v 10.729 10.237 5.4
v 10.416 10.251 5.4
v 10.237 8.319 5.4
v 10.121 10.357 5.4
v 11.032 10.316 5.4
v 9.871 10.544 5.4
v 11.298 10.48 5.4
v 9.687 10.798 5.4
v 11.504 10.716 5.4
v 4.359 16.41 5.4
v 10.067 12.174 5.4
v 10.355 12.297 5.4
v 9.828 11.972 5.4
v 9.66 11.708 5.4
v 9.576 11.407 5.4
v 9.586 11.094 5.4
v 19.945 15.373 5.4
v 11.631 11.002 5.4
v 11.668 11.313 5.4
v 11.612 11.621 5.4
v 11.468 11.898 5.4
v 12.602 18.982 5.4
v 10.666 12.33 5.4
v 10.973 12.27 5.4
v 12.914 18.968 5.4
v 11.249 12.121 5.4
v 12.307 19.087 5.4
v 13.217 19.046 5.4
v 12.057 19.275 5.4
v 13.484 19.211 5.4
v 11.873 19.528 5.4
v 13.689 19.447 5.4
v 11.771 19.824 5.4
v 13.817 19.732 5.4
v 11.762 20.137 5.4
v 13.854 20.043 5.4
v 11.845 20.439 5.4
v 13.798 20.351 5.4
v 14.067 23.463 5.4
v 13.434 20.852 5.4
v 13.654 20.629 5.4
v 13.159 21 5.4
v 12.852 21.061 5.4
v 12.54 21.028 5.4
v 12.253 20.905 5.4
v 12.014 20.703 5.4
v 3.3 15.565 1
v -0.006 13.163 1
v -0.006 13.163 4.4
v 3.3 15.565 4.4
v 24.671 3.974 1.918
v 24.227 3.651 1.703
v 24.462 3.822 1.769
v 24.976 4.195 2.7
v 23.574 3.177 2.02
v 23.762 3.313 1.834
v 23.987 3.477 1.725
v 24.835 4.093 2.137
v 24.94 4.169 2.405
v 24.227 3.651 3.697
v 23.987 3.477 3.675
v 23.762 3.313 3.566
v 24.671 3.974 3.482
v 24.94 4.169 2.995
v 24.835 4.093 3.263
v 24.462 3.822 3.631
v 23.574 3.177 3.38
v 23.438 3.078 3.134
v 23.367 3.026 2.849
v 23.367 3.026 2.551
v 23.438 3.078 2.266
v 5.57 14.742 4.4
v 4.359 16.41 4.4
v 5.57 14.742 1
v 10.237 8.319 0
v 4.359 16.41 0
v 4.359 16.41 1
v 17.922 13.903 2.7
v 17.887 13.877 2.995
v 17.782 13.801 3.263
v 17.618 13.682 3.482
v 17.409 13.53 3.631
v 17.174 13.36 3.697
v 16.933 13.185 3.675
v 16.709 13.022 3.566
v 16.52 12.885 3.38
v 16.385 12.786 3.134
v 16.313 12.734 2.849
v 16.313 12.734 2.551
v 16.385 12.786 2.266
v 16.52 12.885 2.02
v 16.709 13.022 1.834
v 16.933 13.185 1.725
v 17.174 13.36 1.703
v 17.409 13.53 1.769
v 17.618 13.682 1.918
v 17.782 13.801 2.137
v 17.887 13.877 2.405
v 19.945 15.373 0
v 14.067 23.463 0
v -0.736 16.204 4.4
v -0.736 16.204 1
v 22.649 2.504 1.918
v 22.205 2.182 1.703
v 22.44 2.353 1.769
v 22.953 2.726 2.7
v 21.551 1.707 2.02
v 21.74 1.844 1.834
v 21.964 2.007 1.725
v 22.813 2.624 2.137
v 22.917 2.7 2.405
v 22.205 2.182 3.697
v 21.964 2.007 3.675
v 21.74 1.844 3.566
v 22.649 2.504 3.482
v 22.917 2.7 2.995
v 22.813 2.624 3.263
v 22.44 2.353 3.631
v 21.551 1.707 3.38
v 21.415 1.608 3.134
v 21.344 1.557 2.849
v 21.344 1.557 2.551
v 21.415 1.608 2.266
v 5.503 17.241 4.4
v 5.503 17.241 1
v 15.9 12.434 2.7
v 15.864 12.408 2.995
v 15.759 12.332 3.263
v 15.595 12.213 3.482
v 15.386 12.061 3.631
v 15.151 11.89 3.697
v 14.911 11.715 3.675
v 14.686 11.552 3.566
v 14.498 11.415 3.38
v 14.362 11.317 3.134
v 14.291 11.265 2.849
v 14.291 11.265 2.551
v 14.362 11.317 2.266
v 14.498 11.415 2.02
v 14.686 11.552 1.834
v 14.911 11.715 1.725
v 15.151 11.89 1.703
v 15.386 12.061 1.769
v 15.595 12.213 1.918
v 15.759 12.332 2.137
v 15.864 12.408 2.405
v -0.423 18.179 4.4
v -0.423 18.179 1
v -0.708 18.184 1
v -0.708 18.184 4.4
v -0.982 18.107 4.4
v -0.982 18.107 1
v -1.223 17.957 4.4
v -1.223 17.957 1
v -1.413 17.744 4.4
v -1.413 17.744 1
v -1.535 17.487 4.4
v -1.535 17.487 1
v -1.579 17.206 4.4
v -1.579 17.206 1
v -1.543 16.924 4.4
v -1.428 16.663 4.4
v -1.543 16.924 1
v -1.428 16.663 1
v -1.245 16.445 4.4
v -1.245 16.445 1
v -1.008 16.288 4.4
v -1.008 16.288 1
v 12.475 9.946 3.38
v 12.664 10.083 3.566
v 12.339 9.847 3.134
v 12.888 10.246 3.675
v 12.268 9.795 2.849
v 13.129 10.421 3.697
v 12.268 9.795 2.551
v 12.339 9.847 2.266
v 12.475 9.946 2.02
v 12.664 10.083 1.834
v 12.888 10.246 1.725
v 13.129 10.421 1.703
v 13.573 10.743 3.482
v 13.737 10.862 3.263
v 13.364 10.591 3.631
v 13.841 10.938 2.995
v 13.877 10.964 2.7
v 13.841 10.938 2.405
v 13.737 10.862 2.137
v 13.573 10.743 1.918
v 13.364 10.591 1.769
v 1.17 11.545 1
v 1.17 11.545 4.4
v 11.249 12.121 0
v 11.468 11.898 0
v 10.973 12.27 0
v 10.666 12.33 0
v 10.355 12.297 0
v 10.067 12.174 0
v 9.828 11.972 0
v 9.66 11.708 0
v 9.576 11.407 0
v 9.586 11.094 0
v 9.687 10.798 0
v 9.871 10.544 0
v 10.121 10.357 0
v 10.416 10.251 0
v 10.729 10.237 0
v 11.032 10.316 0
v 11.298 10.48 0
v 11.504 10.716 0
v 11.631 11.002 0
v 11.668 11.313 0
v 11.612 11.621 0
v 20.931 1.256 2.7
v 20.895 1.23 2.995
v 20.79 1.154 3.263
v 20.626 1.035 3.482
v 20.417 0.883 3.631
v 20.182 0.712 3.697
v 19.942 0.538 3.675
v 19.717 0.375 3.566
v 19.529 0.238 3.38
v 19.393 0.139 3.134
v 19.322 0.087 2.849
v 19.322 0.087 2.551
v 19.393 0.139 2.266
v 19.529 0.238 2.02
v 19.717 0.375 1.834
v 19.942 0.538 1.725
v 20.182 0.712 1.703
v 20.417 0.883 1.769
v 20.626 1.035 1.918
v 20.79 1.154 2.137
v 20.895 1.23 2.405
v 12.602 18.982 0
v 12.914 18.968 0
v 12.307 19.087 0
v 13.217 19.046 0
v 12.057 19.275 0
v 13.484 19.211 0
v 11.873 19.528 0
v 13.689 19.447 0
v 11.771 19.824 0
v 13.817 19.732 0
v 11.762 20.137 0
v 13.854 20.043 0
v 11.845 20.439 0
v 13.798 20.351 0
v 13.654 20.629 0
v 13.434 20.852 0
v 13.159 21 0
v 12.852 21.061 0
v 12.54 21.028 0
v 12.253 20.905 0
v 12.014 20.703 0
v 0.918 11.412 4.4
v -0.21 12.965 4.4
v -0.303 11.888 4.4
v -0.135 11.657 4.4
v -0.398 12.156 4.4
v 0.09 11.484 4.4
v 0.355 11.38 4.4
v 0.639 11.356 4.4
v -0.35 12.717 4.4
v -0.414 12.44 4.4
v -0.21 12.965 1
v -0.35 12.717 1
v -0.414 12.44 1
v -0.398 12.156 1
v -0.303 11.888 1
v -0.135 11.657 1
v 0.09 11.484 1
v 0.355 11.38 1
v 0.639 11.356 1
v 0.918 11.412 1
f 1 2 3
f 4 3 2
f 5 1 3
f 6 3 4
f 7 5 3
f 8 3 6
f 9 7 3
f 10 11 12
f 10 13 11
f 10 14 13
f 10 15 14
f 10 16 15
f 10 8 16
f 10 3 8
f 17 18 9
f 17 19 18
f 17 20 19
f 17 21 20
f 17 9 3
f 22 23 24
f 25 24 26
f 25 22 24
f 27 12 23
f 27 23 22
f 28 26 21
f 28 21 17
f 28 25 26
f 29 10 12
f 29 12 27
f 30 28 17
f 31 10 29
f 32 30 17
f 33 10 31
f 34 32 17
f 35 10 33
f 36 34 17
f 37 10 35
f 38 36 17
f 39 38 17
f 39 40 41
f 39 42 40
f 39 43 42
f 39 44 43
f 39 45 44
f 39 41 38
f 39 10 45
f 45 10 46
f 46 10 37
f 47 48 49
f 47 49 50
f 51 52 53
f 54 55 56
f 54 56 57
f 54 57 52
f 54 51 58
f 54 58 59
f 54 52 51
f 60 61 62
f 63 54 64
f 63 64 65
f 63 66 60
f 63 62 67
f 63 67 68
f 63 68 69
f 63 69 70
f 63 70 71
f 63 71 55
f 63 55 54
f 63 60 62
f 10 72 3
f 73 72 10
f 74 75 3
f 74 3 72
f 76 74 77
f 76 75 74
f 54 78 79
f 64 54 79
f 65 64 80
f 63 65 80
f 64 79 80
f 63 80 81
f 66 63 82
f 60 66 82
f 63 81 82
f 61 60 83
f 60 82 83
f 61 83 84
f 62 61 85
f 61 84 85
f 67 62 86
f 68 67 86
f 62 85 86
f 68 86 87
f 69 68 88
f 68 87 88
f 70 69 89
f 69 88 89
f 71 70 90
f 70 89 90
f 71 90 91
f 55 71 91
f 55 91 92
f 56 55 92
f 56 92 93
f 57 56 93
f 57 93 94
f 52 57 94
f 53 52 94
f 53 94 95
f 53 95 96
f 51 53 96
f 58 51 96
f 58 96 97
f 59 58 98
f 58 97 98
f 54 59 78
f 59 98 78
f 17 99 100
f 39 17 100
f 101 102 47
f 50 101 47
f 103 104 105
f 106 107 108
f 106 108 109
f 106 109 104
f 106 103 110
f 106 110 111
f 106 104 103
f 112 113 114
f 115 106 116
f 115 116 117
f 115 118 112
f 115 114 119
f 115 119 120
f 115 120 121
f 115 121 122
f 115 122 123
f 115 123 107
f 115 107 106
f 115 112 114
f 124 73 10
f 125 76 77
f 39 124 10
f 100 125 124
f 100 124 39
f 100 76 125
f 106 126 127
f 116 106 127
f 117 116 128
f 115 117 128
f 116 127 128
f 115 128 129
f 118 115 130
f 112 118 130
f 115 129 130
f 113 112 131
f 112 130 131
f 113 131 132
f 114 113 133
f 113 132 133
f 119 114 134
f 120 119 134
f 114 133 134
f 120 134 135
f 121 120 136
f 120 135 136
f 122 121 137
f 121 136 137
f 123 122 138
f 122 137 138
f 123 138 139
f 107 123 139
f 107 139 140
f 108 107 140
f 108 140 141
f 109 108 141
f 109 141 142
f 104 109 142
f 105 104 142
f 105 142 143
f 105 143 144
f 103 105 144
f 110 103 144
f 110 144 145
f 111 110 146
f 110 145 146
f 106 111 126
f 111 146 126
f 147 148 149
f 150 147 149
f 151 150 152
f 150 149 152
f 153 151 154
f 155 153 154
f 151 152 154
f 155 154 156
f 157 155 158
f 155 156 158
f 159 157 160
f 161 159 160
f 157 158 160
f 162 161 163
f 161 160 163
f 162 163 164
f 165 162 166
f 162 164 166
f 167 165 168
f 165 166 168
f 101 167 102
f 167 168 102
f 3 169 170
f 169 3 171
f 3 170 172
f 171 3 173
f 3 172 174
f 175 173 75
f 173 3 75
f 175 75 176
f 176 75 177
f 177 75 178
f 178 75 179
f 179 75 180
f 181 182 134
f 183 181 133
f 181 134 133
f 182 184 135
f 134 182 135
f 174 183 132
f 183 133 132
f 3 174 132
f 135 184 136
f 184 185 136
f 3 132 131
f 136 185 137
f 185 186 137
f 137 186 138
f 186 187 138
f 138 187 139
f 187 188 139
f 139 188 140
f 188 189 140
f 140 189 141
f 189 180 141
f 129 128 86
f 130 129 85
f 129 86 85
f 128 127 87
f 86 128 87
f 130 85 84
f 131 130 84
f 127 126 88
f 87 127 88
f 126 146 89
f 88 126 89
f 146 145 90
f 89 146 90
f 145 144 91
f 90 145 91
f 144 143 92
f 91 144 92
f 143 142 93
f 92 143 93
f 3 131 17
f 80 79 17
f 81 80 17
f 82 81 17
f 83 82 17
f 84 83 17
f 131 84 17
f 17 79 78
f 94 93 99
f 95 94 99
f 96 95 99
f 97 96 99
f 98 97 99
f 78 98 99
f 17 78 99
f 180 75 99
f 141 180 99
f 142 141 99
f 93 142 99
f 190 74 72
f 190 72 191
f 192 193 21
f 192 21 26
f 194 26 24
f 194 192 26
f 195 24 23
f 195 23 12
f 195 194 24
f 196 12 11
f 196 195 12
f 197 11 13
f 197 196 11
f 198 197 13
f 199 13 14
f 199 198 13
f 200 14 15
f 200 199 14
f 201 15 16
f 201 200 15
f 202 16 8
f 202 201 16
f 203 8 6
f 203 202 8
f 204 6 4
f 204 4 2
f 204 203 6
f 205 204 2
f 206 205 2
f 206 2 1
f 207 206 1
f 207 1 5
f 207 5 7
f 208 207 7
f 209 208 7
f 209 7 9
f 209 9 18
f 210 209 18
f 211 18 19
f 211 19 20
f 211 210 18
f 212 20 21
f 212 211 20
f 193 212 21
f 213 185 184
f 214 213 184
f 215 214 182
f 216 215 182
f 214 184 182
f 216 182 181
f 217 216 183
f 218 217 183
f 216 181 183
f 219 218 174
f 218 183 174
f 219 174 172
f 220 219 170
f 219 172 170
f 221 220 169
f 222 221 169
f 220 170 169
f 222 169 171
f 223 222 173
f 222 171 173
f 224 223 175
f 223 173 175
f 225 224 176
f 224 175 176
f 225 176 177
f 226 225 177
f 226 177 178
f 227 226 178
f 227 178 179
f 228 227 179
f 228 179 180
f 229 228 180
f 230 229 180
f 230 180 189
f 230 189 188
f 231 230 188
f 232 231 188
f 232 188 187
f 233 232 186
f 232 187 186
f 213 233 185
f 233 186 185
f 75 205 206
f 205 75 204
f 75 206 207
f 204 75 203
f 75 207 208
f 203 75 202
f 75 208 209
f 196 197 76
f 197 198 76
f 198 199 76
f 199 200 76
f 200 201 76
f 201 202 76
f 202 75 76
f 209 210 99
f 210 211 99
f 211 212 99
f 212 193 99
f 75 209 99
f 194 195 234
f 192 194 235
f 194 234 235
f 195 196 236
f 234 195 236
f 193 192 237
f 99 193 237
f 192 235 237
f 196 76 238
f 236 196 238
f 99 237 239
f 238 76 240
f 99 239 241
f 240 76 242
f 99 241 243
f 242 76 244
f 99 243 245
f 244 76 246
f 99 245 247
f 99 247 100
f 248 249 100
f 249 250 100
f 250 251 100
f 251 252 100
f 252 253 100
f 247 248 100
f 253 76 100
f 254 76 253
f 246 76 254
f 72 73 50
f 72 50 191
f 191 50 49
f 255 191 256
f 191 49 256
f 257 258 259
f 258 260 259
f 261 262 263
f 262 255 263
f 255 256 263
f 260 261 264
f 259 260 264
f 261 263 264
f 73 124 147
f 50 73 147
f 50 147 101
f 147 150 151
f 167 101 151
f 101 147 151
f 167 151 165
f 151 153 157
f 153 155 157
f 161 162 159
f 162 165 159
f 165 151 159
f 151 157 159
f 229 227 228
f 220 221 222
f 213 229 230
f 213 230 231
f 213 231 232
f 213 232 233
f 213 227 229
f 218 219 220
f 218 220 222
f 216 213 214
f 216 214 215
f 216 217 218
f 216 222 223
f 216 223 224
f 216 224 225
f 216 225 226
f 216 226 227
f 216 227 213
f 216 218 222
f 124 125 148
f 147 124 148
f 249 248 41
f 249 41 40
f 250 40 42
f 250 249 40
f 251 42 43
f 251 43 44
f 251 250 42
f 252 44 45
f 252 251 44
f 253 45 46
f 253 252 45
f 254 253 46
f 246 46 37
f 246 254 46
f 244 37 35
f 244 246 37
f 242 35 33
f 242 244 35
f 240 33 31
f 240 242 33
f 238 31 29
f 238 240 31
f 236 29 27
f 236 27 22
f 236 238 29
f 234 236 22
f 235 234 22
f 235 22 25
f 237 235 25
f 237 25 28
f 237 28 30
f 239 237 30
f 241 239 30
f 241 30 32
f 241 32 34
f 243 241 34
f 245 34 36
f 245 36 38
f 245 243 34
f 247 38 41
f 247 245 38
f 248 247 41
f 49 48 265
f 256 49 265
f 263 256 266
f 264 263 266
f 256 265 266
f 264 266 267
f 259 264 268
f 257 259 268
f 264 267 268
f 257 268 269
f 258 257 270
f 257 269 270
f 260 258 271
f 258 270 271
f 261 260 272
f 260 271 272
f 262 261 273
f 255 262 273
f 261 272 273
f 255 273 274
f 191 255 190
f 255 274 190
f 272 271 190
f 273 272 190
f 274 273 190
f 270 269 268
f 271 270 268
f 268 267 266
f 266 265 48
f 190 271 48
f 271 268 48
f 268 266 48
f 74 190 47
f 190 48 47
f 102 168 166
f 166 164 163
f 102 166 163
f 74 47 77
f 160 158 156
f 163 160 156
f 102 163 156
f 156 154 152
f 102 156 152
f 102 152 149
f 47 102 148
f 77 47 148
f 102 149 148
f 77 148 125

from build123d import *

# Parameters (mm, degrees)
SKETCH004_W             = 12
SKETCH004_H             = 10
SKETCH004_R             = 1.05
PAD004_DEPTH            = 5.4
PAD005_START            = 1
PAD005_DEPTH            = 3.4
SKETCH006_R             = 1
PAD006_DEPTH            = 12
PAD007_START            = 1
PAD007_DEPTH            = 3.4
BODY003_PLACEMENT_ANGLE = 324


with BuildPart() as part:
    # Sketch004 → Pad004 (new body)
    with BuildSketch(Plane.XY):
        with Locations((6, 5)):
            Rectangle(SKETCH004_W, SKETCH004_H)
        with Locations((2.05, 2.171592)):
            Circle(SKETCH004_R, mode=Mode.SUBTRACT)
        with Locations((8.95, 7.95)):
            Circle(SKETCH004_R, mode=Mode.SUBTRACT)
    extrude(amount=PAD004_DEPTH)

    # Sketch005 → Pad005 (join)
    with BuildSketch(Plane.XY.offset(PAD005_START)):
        with BuildLine():
            Line((-4.242641, 12.828427), (0.353553, 8.232233))
            Line((0.353553, 8.232233), (1.767767, 9.646447))
            Line((1.767767, 9.646447), (-2.828427, 14.242641))
            ThreePointArc((-2.828427, 14.242641), (-4.242641, 14.242641), (-4.242641, 12.828427))
        make_face()
    extrude(amount=PAD005_DEPTH)

    # Sketch006 (on Face1 of Pad005) → Pad006 (join)
    with BuildSketch(Plane.XZ):
        with Locations((3.5, 2.7)):
            Circle(SKETCH006_R)
        with Locations((6, 2.7)):
            Circle(SKETCH006_R)
        with Locations((8.5, 2.7)):
            Circle(SKETCH006_R)
    extrude(amount=PAD006_DEPTH)

    # Sketch007 → Pad007 (join)
    with BuildSketch(Plane.XY.offset(PAD007_START)):
        with BuildLine():
            Line((1.06066, 7.93934), (-5.43934, 7.93934))
            ThreePointArc((-5.43934, 9.93934), (-6.43934, 8.93934), (-5.43934, 7.93934))
            Line((-5.43934, 9.93934), (1.06066, 9.93934))
            Line((1.06066, 7.93934), (1.06066, 9.93934))
        make_face()
    extrude(amount=PAD007_DEPTH)


with BuildPart() as part_1:
    # Body003 placement: moved
    add(part.part.moved(Location((10.236799, 8.319416, 0))).rotate(Axis((10.236799, 8.319416, 0), (0, 0, -1)), BODY003_PLACEMENT_ANGLE))


solid = part_1.part
